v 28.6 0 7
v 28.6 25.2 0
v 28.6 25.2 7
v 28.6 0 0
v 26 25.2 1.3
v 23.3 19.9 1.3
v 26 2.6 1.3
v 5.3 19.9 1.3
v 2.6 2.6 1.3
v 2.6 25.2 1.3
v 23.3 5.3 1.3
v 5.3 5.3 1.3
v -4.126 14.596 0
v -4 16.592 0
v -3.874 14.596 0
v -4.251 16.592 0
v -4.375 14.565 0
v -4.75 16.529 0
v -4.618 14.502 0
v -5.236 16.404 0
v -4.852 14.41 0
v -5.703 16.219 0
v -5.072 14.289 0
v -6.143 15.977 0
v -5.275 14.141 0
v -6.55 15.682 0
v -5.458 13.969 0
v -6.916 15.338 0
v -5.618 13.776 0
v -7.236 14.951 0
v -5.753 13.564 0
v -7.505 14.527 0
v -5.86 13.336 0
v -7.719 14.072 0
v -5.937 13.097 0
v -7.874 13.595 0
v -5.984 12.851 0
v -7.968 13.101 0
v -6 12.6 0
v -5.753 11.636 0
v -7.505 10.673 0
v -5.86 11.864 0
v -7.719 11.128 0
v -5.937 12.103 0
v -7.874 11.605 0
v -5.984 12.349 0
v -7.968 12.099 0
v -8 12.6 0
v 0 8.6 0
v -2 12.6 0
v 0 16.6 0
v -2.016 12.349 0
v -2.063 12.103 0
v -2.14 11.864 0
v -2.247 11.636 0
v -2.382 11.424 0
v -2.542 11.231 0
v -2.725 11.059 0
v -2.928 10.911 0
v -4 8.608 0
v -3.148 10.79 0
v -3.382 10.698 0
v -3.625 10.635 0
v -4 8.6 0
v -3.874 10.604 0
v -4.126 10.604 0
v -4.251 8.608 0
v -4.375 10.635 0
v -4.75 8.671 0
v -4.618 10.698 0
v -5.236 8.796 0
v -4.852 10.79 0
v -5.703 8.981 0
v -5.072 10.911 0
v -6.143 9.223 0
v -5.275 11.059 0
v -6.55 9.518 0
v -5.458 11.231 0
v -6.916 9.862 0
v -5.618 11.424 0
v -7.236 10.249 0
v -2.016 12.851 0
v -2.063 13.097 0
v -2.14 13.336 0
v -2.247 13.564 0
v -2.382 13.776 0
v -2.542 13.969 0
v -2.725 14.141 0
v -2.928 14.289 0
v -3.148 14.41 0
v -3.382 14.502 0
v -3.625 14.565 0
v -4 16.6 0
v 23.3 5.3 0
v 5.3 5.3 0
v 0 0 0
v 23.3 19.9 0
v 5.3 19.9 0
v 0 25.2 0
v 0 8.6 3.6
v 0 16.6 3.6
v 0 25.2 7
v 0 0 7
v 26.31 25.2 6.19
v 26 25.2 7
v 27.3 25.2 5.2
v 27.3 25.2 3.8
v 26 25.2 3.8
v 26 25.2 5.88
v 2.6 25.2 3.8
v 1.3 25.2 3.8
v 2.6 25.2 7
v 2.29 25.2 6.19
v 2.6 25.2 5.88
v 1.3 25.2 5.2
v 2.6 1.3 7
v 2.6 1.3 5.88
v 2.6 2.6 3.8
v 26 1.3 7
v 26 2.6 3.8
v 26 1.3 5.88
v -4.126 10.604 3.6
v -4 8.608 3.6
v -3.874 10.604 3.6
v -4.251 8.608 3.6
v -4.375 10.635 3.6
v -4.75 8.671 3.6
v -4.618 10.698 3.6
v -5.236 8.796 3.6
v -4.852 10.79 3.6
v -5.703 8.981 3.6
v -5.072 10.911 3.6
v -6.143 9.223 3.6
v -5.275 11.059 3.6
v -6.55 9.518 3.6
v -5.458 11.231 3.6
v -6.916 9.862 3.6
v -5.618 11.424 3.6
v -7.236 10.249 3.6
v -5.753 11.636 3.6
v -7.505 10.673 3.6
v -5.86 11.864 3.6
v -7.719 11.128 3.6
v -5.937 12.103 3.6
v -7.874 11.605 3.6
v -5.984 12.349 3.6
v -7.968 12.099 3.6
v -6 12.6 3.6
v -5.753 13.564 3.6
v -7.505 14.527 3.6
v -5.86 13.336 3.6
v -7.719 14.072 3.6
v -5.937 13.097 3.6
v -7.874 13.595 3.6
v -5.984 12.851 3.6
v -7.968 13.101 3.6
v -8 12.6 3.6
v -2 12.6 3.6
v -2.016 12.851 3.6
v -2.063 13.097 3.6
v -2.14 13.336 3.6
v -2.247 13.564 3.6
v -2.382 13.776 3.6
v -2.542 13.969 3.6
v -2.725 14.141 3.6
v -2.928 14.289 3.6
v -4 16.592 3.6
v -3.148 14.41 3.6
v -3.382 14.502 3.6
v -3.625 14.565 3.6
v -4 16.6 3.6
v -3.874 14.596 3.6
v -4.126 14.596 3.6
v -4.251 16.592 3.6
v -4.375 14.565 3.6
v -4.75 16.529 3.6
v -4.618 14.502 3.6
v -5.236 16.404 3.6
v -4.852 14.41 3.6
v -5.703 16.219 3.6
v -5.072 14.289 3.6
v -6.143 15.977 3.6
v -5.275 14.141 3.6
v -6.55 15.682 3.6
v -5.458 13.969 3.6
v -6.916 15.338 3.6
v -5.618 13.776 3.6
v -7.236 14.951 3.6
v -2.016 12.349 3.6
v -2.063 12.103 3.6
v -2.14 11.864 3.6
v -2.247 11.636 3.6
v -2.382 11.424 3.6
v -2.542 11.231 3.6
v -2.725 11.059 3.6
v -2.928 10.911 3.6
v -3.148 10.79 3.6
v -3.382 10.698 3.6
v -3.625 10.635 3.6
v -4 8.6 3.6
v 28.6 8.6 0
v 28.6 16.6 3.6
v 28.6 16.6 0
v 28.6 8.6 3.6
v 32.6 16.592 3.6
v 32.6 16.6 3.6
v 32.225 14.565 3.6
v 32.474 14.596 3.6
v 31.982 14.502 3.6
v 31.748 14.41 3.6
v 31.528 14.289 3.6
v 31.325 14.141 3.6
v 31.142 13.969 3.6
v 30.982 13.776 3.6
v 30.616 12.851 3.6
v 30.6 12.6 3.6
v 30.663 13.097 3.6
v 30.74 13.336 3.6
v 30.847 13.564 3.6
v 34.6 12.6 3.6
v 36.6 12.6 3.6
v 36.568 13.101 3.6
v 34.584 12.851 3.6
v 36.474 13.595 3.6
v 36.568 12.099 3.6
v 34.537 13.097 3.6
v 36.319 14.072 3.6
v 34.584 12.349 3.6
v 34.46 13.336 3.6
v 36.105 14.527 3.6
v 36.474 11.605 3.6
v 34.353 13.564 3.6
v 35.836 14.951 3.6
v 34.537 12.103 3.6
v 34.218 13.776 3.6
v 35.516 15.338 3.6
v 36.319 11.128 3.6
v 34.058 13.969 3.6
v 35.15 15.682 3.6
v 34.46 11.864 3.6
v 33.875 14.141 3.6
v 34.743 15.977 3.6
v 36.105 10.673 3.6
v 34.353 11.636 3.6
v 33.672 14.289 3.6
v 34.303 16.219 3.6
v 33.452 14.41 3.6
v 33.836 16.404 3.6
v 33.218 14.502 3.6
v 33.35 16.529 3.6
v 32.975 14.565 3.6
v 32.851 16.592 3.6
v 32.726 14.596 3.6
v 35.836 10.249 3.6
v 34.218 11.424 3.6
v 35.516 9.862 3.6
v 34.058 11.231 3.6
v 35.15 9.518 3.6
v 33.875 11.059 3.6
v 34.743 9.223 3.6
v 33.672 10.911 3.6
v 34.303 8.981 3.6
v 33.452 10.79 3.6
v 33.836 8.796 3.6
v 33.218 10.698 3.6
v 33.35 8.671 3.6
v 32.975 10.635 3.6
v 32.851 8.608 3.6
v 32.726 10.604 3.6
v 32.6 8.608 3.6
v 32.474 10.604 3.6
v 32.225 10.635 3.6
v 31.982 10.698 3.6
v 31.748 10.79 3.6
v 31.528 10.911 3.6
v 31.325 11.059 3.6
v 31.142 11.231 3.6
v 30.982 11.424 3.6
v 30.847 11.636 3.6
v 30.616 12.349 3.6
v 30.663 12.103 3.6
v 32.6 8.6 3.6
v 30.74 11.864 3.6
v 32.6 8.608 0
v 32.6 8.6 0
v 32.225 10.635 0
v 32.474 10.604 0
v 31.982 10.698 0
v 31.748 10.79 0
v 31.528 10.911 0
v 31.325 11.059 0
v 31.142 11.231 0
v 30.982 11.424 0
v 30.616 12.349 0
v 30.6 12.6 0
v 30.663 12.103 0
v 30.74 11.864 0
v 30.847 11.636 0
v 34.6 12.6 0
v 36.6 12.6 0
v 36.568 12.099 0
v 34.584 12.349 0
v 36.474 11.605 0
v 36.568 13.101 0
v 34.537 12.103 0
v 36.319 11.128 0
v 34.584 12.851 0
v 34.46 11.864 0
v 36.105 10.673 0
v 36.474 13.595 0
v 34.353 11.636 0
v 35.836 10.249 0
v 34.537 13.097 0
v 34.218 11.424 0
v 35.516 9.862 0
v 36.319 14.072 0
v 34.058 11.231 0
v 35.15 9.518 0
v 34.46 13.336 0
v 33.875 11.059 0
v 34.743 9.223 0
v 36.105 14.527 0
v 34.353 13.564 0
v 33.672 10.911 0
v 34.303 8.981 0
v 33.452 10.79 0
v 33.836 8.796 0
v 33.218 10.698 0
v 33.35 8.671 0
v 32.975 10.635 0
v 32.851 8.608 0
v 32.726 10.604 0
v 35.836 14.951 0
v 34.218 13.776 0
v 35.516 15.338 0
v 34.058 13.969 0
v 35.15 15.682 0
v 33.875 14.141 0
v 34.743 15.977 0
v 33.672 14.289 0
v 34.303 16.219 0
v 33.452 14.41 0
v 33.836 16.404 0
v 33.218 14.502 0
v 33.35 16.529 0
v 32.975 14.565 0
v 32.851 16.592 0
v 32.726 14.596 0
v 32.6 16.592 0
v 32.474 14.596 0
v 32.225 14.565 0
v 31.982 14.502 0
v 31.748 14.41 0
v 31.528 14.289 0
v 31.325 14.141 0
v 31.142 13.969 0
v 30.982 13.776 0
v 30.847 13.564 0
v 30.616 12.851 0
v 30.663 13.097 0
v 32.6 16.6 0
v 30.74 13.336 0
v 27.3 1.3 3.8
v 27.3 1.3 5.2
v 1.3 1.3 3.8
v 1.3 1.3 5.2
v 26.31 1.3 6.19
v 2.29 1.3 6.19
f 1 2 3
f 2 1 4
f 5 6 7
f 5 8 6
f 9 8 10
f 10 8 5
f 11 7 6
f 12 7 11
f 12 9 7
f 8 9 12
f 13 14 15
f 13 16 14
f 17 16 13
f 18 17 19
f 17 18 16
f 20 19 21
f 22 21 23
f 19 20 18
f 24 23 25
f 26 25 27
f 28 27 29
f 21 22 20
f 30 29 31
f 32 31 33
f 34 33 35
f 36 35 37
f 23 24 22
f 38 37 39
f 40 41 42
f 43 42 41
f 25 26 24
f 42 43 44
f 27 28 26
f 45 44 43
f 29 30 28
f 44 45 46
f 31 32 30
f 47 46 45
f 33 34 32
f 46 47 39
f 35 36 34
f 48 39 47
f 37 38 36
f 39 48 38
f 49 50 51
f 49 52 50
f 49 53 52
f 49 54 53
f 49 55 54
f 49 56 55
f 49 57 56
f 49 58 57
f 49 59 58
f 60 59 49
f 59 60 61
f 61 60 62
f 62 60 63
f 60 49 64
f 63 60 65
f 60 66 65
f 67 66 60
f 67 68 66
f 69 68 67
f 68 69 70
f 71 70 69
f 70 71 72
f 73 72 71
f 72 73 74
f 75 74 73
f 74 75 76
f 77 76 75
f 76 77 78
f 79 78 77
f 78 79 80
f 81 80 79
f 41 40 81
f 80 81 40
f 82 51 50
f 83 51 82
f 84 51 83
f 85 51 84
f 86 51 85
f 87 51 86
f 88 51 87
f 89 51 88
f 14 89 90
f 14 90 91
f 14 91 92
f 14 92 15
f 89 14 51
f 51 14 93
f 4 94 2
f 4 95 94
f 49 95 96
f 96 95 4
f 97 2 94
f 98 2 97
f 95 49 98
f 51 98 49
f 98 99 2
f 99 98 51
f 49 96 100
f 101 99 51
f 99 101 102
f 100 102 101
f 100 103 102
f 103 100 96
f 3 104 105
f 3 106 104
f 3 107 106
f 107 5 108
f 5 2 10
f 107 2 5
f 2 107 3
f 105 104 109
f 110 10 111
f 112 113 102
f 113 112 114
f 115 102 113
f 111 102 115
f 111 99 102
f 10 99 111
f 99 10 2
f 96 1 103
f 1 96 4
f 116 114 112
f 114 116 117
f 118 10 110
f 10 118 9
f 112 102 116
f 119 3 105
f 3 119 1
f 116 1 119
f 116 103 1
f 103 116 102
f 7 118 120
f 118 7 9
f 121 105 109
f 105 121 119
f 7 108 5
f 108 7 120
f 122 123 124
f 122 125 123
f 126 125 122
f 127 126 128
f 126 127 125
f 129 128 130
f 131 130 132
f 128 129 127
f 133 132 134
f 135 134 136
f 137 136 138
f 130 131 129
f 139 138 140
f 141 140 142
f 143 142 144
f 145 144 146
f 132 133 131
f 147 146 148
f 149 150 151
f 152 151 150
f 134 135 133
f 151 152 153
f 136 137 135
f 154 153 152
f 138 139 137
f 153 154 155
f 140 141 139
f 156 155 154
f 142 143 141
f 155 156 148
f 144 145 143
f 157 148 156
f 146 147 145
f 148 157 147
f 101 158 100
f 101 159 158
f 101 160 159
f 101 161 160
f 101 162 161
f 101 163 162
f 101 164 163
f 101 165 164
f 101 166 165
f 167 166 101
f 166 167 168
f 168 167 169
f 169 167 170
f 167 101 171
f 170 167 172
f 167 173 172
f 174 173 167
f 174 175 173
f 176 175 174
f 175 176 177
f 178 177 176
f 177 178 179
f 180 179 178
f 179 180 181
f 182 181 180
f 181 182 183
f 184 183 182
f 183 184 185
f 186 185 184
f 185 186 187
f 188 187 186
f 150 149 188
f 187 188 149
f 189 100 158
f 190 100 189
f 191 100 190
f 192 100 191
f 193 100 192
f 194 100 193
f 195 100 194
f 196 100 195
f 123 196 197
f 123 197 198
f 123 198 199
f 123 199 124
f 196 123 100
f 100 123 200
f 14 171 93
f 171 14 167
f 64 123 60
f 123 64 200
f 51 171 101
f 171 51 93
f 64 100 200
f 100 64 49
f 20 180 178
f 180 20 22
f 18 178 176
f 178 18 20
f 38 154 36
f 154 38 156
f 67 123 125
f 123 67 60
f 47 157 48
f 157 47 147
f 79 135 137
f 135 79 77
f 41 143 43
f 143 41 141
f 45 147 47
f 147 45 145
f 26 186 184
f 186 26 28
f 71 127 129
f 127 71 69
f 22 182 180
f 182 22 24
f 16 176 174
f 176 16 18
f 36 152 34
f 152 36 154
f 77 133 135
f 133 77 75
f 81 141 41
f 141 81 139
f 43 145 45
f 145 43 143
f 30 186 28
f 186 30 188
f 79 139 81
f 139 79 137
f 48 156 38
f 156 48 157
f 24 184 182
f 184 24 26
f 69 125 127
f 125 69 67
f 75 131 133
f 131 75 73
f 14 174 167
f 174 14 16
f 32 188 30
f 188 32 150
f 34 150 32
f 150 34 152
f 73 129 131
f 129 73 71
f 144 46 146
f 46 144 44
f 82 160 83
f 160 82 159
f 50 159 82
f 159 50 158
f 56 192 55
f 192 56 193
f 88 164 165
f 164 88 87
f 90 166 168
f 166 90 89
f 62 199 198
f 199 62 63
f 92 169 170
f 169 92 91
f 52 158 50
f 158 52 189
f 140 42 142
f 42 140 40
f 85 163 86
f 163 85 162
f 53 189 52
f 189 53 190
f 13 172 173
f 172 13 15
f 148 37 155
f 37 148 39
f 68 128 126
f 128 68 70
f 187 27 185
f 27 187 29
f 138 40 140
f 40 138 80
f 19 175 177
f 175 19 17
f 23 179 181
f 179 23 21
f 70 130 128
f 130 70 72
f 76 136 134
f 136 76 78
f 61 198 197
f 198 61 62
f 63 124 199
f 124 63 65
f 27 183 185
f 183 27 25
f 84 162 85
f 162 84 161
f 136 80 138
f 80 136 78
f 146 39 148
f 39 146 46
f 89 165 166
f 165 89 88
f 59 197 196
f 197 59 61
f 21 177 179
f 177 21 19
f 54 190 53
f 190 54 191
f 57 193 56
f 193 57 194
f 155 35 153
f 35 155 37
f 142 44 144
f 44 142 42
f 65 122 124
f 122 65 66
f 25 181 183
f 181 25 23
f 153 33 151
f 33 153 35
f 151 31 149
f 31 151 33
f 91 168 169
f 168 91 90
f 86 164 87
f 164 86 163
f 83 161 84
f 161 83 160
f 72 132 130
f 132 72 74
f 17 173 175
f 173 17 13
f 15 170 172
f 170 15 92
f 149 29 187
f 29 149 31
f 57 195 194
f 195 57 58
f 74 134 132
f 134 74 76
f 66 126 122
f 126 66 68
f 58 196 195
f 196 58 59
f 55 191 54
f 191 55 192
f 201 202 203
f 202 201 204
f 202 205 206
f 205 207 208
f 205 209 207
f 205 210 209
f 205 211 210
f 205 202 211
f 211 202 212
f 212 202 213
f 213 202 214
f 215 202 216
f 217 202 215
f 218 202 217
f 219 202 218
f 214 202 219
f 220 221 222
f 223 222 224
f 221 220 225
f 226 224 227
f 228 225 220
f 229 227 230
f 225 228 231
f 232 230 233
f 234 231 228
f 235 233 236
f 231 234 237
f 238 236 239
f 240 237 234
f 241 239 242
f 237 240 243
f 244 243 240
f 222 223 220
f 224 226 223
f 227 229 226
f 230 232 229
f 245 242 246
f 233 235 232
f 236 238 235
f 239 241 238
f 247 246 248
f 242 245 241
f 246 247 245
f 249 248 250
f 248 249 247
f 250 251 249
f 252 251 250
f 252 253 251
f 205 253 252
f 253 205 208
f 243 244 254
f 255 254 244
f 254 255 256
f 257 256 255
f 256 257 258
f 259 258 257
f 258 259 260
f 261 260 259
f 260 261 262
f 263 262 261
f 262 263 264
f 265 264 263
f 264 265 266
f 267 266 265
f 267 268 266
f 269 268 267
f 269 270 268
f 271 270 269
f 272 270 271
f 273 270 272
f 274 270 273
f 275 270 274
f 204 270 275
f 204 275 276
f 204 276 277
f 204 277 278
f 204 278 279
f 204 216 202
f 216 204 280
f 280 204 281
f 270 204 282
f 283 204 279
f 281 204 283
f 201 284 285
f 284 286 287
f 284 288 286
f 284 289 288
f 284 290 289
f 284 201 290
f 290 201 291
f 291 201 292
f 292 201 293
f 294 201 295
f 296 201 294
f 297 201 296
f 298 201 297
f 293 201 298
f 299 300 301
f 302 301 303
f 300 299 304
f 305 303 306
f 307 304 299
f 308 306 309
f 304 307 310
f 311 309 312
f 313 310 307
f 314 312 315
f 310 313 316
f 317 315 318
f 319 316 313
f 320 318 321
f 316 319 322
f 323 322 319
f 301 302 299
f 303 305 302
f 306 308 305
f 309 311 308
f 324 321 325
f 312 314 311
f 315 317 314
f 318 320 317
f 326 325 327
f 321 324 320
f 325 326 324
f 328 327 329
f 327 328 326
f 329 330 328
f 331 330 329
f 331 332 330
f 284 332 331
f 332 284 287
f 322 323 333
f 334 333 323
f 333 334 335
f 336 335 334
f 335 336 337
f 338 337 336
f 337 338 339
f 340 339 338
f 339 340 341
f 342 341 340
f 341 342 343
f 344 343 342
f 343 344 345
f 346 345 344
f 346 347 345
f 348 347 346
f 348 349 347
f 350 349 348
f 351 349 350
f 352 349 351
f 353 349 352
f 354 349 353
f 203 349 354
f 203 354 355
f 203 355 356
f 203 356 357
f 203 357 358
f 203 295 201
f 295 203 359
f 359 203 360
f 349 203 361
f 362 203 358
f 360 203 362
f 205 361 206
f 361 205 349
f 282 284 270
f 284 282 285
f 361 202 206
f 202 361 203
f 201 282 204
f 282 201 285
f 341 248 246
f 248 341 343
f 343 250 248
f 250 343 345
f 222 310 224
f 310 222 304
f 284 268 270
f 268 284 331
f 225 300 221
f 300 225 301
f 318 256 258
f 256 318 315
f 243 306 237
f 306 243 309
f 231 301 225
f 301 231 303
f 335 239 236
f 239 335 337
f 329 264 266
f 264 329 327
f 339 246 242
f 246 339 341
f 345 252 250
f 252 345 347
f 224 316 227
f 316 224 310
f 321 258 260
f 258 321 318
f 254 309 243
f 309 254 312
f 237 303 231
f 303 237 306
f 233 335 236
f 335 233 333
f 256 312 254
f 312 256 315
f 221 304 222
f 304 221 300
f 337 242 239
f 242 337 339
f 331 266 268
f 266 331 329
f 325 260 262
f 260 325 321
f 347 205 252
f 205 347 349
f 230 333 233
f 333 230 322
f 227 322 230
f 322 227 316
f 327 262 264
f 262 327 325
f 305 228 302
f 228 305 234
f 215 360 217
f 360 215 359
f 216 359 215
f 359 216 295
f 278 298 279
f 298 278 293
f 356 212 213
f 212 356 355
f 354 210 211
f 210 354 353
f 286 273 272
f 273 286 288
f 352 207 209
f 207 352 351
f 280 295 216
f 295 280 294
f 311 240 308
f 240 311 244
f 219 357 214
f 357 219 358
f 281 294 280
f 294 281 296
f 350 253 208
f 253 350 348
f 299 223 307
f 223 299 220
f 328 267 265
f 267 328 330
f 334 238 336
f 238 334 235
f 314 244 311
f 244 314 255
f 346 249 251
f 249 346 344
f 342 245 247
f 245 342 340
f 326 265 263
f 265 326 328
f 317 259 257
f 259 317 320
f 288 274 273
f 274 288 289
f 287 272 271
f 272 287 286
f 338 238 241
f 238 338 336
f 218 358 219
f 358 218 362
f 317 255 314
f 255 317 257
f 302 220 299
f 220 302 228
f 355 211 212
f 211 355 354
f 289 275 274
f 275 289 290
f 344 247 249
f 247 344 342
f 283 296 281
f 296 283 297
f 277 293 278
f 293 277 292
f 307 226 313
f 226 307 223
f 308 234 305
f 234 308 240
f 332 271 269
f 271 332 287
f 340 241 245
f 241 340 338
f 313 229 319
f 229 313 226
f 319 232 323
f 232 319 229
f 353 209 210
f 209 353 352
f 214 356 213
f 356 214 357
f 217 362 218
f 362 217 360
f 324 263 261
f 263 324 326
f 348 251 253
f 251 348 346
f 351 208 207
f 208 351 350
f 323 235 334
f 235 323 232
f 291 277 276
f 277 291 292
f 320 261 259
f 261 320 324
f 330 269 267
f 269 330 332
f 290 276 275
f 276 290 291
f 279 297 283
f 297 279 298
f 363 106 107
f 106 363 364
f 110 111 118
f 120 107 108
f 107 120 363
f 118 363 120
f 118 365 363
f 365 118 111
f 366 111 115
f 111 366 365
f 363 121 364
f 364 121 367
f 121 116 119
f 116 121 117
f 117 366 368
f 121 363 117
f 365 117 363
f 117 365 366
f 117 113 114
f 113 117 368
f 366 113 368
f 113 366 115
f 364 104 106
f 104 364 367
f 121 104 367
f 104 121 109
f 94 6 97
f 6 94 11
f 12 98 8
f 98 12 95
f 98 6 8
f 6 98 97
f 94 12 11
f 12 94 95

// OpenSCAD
// file: ../lib/pcb_led_cvf.scad
// for led power module modified

/* bluetooth_mate_holder.scad
 * By John Biehler - November 17, 2011
 * http://www.thingiverse.com/thing:

 * derived from pcb_box_slide_with_tabs.scad
 * By Nicholas C Lewis - Jan 1, 2011
 * http://www.thingiverse.com/thing:5396
 *
 * derived from pcb_box_slide.scad
 *     Parametric, open PCB-box (slide-in) by chlunde
 *     http://www.thingiverse.com/thing:4071
 *
 * CHANGES
 * - adjusted to fit Arduino Mega
 * - added mounting tabs
 * - turned off cutouts
 * - adjusted bottom cutout size
 */

$fn=50;

module pcb_led_cvf(

	pcb_width = 48.2,
	pcb_length =24.1,
	pcb_height =1.1,
	slisse = 0.8,

	pcb_bottom_margin = 1,
	wall_width_thick = 2,
	box_height = 7,

	//tab parameters
	tab_hole_radius=2,
	tab_outer_radius=4,

	inner_margin = 4,

	add_tabs = true

) {
	wall_width = wall_width_thick-slisse;

module tab() {
	difference(){
		union() {
			translate([-tab_outer_radius,-tab_outer_radius,0])
			cube([tab_outer_radius,2*tab_outer_radius,wall_width_thick+1]);
			translate([-tab_outer_radius,0,0])
				cylinder(r=tab_outer_radius, h = wall_width_thick+1);
		}
		translate([-tab_outer_radius,0,0]) {
			cylinder(r= tab_hole_radius, h = wall_width_thick+5,center=true);
		}
	}

}

module box() {
	union() {
		cube([pcb_width + 2*wall_width, pcb_length + 2*wall_width, wall_width]);

		cube([wall_width_thick, pcb_length + 2*wall_width, box_height]);

		cube([pcb_width + 2*wall_width, wall_width_thick, box_height]);

		%translate([0, pcb_length+wall_width, 0])
			cube([pcb_width + 2*wall_width,wall_width,box_height]);

		translate([pcb_width + wall_width - slisse,0,0])
			cube([wall_width_thick, pcb_length + 2*wall_width, box_height]);
	}
	if(add_tabs) {
//comment out this part to remove tabs
		for(i=[(pcb_length + 2*wall_width)/2]){
	translate([0,i,0])tab();
	translate([pcb_width + 2*wall_width,i,0])mirror()tab();
		}
	}

}

module pcb() {
	translate([wall_width, wall_width, wall_width + pcb_bottom_margin])
		cube([pcb_width,pcb_length + wall_width + 0.1,pcb_height]);
	translate([wall_width, wall_width, wall_width + pcb_bottom_margin+pcb_height])rotate([0,45,0])
		cube([pcb_height,pcb_length + wall_width + 0.1,pcb_height]);
	translate([wall_width+pcb_width-2*cos(45)*pcb_height, wall_width, wall_width + pcb_bottom_margin+pcb_height])rotate([0,45,0])
		cube([pcb_height,pcb_length + wall_width + 0.1,pcb_height]);
	translate([wall_width_thick, wall_width, wall_width + pcb_bottom_margin])
		cube([pcb_width-2*slisse,pcb_length + wall_width + 0.1,box_height]);

}



module holes() {
		*translate([wall_width + pcb_width/2, wall_width_thick + 0.1, pcb_width/2+wall_width])
			rotate(a=90,v=[1,0,0])
				cylinder(r=pcb_width/2, h=wall_width_thick + 0.2);

		*translate([-0.1, wall_width + pcb_length/2, pcb_length/2 + wall_width])
			rotate(a=90,v=[0,1,0])
				cylinder(r=pcb_length/2, h=wall_width_thick + 0.2);

		*translate([pcb_width + wall_width - slisse - 0.1, wall_width + pcb_length/2, pcb_length/2 + wall_width])
			rotate(a=90,v=[0,1,0])
				cylinder(r=pcb_length/2, h=wall_width_thick + 0.2);

	 * translate([pcb_width/2 + wall_width, wall_width + pcb_length/2, -0.1])
			rotate(a=0,v=[0,1,0])
				cylinder(r=min(pcb_length,pcb_width)/2 - wall_width/2, h=wall_width_thick + 0.2);

		translate([inner_margin +wall_width, inner_margin+wall_width, -0.1])
			cube([pcb_width-inner_margin*2,pcb_length -inner_margin*2,wall_width + 0.2]);
}

	difference() {
		box();
		pcb();
		holes();
	}
}



pcb_led_cvf();
// main file
use <../lib/pcb_led_cvf.scad>


pcb_led_cvf(
  pcb_length=22.6,
  pcb_width=26,
  pcb_height=1.4,
  pcb_bottom_margin=2.5,
  slisse=1.3,
  wall_width_thick = 2.6
);
